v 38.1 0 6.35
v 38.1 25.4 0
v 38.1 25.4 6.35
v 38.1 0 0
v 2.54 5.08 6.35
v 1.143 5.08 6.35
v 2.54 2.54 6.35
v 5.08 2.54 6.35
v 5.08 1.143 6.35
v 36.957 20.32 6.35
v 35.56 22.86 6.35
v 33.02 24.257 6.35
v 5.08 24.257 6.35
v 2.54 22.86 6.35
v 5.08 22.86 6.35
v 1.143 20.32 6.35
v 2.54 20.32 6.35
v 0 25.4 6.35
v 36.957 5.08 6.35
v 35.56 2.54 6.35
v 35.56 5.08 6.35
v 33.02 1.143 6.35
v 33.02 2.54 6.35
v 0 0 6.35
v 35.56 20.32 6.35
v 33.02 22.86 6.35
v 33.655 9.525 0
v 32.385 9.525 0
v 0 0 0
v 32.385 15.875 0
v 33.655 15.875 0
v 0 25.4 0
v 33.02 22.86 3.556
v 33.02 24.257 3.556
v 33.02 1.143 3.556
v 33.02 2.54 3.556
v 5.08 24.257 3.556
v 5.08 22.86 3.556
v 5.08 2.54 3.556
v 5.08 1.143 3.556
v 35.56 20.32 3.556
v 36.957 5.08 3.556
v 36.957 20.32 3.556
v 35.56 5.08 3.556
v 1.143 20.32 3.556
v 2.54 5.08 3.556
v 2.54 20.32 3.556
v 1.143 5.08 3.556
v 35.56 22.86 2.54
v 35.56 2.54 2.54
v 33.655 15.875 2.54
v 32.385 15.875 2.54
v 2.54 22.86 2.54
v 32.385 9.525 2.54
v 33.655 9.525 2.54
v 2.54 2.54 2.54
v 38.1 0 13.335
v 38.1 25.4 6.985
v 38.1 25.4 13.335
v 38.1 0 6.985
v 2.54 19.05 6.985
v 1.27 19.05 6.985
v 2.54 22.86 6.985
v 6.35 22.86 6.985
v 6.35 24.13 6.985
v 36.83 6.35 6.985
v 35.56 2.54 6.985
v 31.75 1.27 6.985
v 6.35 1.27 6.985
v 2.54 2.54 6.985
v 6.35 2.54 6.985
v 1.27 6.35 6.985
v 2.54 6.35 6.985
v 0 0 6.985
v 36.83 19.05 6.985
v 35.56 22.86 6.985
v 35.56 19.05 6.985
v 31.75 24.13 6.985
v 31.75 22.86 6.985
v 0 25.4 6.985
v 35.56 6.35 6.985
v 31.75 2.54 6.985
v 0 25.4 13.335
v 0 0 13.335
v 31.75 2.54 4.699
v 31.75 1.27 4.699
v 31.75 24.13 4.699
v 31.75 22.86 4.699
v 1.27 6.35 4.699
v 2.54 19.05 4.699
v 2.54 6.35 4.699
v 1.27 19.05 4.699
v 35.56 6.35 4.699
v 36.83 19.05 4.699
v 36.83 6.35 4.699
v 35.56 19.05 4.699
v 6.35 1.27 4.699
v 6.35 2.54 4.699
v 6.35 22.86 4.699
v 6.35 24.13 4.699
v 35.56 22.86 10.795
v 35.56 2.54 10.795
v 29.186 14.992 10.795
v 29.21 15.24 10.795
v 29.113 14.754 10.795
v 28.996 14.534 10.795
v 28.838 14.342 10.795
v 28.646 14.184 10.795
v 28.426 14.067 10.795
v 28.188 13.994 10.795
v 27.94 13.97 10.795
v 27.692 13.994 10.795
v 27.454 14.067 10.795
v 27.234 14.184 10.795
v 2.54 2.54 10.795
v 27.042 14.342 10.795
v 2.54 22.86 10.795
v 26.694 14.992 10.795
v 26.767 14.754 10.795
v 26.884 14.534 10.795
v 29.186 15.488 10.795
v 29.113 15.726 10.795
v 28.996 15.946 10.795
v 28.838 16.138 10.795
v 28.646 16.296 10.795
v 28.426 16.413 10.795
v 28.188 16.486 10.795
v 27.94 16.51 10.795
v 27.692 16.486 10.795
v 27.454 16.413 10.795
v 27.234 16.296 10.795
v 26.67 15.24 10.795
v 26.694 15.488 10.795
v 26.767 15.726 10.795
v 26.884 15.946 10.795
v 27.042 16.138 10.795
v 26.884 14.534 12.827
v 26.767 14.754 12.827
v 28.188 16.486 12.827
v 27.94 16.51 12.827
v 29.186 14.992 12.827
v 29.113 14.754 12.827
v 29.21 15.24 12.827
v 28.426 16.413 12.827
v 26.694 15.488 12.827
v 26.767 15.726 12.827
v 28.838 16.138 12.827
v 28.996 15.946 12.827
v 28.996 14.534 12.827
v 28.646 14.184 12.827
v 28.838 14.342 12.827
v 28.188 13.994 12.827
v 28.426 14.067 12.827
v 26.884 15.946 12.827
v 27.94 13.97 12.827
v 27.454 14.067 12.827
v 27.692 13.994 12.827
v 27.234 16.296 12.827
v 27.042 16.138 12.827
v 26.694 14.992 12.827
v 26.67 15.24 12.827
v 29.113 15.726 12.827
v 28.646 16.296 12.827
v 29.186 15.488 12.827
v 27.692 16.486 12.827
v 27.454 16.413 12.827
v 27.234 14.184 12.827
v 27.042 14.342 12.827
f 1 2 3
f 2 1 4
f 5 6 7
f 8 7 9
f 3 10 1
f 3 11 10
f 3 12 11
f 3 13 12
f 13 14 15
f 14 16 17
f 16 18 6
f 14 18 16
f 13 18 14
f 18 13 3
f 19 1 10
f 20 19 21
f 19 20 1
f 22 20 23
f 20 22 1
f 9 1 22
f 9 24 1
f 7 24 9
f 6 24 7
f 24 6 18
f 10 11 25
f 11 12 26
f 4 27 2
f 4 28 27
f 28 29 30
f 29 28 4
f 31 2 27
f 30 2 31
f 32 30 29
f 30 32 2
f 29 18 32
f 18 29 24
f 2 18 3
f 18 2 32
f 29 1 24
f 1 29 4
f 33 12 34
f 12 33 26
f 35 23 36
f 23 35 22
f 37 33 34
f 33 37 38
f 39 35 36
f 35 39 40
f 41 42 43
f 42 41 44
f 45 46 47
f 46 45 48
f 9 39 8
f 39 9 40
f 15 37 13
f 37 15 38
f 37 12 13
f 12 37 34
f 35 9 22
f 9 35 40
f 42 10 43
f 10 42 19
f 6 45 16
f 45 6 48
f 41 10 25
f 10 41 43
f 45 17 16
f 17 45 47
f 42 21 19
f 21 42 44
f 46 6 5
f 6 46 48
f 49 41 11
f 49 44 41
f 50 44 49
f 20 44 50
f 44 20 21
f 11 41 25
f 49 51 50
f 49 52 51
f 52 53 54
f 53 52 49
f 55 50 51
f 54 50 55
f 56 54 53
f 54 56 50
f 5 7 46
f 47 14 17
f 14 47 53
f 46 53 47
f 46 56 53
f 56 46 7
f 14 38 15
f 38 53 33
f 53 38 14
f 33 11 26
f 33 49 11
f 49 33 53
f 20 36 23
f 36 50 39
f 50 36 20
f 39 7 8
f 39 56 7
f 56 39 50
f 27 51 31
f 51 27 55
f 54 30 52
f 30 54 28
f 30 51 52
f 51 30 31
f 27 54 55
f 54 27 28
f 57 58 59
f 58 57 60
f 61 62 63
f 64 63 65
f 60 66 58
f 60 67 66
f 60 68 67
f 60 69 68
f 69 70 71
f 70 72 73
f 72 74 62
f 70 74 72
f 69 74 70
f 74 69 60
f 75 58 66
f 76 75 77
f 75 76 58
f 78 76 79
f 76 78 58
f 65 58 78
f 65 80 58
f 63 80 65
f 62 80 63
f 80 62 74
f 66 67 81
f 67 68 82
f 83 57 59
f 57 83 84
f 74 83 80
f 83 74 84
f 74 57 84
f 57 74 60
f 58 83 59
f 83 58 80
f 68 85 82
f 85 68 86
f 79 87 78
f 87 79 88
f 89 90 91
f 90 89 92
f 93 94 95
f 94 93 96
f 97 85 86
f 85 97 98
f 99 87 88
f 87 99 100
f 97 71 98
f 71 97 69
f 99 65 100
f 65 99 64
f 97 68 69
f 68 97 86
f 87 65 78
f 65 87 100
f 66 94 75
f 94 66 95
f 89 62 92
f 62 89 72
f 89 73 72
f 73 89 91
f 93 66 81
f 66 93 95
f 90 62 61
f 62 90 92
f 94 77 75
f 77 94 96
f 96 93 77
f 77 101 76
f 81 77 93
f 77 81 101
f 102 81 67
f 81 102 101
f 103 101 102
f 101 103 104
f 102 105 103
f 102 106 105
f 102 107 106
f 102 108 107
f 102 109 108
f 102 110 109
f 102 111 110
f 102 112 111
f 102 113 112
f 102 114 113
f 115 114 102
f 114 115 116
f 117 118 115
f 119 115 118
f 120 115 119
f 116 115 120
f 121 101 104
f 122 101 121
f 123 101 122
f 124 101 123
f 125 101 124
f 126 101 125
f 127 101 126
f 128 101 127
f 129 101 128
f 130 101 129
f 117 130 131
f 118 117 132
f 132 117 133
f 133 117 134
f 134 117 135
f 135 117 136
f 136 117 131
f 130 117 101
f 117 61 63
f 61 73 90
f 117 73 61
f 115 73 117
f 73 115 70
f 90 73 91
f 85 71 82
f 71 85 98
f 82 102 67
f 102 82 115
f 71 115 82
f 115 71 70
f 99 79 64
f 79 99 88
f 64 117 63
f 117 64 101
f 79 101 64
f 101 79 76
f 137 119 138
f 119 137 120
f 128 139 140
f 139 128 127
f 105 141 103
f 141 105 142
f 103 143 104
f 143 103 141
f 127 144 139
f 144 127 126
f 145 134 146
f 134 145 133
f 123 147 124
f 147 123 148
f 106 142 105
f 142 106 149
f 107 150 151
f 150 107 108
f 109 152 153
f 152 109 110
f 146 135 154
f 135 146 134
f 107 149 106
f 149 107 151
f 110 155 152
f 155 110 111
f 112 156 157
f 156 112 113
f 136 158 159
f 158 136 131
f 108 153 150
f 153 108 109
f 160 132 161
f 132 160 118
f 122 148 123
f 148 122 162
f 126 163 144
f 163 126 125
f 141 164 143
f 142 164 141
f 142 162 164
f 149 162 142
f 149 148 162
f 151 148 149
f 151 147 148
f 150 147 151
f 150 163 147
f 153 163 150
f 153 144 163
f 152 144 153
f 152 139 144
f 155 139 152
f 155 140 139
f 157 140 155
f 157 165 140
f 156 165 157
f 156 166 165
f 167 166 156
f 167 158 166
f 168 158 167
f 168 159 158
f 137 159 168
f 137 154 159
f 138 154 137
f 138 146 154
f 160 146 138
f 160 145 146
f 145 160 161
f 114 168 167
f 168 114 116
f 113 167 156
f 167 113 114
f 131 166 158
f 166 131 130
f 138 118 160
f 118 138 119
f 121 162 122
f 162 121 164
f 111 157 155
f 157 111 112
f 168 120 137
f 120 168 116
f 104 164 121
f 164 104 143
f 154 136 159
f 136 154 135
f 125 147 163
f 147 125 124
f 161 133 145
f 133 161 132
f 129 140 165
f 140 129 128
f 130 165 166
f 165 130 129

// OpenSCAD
/*
  DigiSparkCase.scad
 
  Author: radiogeek381@gmail.com

  A box that can hold a single DigiStump DigiSpark arduino module.
  It is a clamshell box, with a slot in the bottom for in/out wires
  and a relief in the top for the LED. 
*/ 
/*
Copyright (c) 2016, Matthew H. Reilly (kb1vc)
All rights reserved.

Redistribution and use in source and binary forms, with or without
modification, are permitted provided that the following conditions are
met:

    Redistributions of source code must retain the above copyright
    notice, this list of conditions and the following disclaimer.
    Redistributions in binary form must reproduce the above copyright
    notice, this list of conditions and the following disclaimer in
    the documentation and/or other materials provided with the
    distribution.

THIS SOFTWARE IS PROVIDED BY THE COPYRIGHT HOLDERS AND CONTRIBUTORS
"AS IS" AND ANY EXPRESS OR IMPLIED WARRANTIES, INCLUDING, BUT NOT
LIMITED TO, THE IMPLIED WARRANTIES OF MERCHANTABILITY AND FITNESS FOR
A PARTICULAR PURPOSE ARE DISCLAIMED. IN NO EVENT SHALL THE COPYRIGHT
HOLDER OR CONTRIBUTORS BE LIABLE FOR ANY DIRECT, INDIRECT, INCIDENTAL,
SPECIAL, EXEMPLARY, OR CONSEQUENTIAL DAMAGES (INCLUDING, BUT NOT
LIMITED TO, PROCUREMENT OF SUBSTITUTE GOODS OR SERVICES; LOSS OF USE,
DATA, OR PROFITS; OR BUSINESS INTERRUPTION) HOWEVER CAUSED AND ON ANY
THEORY OF LIABILITY, WHETHER IN CONTRACT, STRICT LIABILITY, OR TORT
(INCLUDING NEGLIGENCE OR OTHERWISE) ARISING IN ANY WAY OUT OF THE USE
OF THIS SOFTWARE, EVEN IF ADVISED OF THE POSSIBILITY OF SUCH DAMAGE.
*/

// All dimensions are in inches -- scaling to mm is at the end.

$fn=32;

// wall thickness
WallThickness = 0.1;

// dimensions of the INSIDE of the box
InnerX = 1.3;
InnerY = 0.8;
InnerZ = 0.15;


// The lower shell has a key (tab) that sticks up.  How high? 
KeyHeight = 0.1;
// How thick? (this subtracts from the wall thickness.
KeyThickness = 0.05;
// Where does the key end? (how far from each inside edge.)
KeySetBack = 0.15;
KeywaySetBack = 0.1;
KeywayThickness = KeyThickness + 0.005; // give a little relief
KeywayDepth =0.6; 

OuterX = InnerX + 2 * WallThickness;
OuterY = InnerY + 2 * WallThickness;
OuterZ = InnerZ + WallThickness;

WireHoleX = 0.05;
WireHoleY = 0.25;
WireHoleOffsetY = OuterY * 0.5;
WireHoleOffsetX = OuterX - (0.1 + WallThickness);

LEDReliefDia = 0.1;
LEDReliefDepth = 0.02; 
LEDOffsetX = OuterX - (0.3 + WallThickness); 
LEDOffsetY = WallThickness + 0.3;


module ClamShellBottom() {
    difference() {
        cube([OuterX, OuterY, OuterZ]);
	translate([WallThickness + KeywaySetBack, WallThickness - KeywayThickness, OuterZ - KeyHeight * 1.1]) {
	    cube([InnerX - 2 * KeywaySetBack, InnerY + 2 * KeywayThickness, InnerZ]);
        }
	// cut space for keys
	translate([WallThickness - KeywayThickness, WallThickness + KeywaySetBack, OuterZ - KeyHeight * 1.1]) {
	    cube([InnerX + 2 * KeywayThickness, InnerY - 2 * KeywaySetBack, InnerZ]);
	}
	translate([WallThickness, WallThickness, WallThickness]) {
	    cube([InnerX, InnerY, InnerZ*2]);
	}
	// cut hole for wires
	translate([WireHoleOffsetX, WireHoleOffsetY, -0.01]) {
	    cube([WireHoleX, WireHoleY, 3*WallThickness], center=true);
	}

    }
}

module ClamShellTop() {
    difference() {
        union() {
	    cube([OuterX, OuterY, OuterZ]);
	    translate([WallThickness + KeySetBack, WallThickness - KeyThickness, OuterZ - 0.01]) {
	        cube([InnerX - 2 * KeySetBack, InnerY + 2 * KeyThickness, KeyHeight]);
            }
	    translate([WallThickness - KeyThickness, WallThickness + KeySetBack, OuterZ - 0.01]) {
	        cube([InnerX + 2 * KeyThickness, InnerY - 2 * KeySetBack, KeyHeight]);
            }
	}
	translate([WallThickness, WallThickness, WallThickness]) {
	    cube([InnerX, InnerY, InnerZ*2]);
	}
	// cut the blind hole for the LED
	translate([LEDOffsetX, LEDOffsetY, LEDReliefDepth]) {
	    cylinder(d=LEDReliefDia, h=WallThickness*2, center=false);
	}
    }
}


scale([25.4,25.4,25.4]) {
    union()
    {
        color("red") ClamShellBottom();
	translate([0,OuterY,2.1*OuterZ])
	    rotate([0,180,180])
	        color("grey") ClamShellTop();
    }
}
